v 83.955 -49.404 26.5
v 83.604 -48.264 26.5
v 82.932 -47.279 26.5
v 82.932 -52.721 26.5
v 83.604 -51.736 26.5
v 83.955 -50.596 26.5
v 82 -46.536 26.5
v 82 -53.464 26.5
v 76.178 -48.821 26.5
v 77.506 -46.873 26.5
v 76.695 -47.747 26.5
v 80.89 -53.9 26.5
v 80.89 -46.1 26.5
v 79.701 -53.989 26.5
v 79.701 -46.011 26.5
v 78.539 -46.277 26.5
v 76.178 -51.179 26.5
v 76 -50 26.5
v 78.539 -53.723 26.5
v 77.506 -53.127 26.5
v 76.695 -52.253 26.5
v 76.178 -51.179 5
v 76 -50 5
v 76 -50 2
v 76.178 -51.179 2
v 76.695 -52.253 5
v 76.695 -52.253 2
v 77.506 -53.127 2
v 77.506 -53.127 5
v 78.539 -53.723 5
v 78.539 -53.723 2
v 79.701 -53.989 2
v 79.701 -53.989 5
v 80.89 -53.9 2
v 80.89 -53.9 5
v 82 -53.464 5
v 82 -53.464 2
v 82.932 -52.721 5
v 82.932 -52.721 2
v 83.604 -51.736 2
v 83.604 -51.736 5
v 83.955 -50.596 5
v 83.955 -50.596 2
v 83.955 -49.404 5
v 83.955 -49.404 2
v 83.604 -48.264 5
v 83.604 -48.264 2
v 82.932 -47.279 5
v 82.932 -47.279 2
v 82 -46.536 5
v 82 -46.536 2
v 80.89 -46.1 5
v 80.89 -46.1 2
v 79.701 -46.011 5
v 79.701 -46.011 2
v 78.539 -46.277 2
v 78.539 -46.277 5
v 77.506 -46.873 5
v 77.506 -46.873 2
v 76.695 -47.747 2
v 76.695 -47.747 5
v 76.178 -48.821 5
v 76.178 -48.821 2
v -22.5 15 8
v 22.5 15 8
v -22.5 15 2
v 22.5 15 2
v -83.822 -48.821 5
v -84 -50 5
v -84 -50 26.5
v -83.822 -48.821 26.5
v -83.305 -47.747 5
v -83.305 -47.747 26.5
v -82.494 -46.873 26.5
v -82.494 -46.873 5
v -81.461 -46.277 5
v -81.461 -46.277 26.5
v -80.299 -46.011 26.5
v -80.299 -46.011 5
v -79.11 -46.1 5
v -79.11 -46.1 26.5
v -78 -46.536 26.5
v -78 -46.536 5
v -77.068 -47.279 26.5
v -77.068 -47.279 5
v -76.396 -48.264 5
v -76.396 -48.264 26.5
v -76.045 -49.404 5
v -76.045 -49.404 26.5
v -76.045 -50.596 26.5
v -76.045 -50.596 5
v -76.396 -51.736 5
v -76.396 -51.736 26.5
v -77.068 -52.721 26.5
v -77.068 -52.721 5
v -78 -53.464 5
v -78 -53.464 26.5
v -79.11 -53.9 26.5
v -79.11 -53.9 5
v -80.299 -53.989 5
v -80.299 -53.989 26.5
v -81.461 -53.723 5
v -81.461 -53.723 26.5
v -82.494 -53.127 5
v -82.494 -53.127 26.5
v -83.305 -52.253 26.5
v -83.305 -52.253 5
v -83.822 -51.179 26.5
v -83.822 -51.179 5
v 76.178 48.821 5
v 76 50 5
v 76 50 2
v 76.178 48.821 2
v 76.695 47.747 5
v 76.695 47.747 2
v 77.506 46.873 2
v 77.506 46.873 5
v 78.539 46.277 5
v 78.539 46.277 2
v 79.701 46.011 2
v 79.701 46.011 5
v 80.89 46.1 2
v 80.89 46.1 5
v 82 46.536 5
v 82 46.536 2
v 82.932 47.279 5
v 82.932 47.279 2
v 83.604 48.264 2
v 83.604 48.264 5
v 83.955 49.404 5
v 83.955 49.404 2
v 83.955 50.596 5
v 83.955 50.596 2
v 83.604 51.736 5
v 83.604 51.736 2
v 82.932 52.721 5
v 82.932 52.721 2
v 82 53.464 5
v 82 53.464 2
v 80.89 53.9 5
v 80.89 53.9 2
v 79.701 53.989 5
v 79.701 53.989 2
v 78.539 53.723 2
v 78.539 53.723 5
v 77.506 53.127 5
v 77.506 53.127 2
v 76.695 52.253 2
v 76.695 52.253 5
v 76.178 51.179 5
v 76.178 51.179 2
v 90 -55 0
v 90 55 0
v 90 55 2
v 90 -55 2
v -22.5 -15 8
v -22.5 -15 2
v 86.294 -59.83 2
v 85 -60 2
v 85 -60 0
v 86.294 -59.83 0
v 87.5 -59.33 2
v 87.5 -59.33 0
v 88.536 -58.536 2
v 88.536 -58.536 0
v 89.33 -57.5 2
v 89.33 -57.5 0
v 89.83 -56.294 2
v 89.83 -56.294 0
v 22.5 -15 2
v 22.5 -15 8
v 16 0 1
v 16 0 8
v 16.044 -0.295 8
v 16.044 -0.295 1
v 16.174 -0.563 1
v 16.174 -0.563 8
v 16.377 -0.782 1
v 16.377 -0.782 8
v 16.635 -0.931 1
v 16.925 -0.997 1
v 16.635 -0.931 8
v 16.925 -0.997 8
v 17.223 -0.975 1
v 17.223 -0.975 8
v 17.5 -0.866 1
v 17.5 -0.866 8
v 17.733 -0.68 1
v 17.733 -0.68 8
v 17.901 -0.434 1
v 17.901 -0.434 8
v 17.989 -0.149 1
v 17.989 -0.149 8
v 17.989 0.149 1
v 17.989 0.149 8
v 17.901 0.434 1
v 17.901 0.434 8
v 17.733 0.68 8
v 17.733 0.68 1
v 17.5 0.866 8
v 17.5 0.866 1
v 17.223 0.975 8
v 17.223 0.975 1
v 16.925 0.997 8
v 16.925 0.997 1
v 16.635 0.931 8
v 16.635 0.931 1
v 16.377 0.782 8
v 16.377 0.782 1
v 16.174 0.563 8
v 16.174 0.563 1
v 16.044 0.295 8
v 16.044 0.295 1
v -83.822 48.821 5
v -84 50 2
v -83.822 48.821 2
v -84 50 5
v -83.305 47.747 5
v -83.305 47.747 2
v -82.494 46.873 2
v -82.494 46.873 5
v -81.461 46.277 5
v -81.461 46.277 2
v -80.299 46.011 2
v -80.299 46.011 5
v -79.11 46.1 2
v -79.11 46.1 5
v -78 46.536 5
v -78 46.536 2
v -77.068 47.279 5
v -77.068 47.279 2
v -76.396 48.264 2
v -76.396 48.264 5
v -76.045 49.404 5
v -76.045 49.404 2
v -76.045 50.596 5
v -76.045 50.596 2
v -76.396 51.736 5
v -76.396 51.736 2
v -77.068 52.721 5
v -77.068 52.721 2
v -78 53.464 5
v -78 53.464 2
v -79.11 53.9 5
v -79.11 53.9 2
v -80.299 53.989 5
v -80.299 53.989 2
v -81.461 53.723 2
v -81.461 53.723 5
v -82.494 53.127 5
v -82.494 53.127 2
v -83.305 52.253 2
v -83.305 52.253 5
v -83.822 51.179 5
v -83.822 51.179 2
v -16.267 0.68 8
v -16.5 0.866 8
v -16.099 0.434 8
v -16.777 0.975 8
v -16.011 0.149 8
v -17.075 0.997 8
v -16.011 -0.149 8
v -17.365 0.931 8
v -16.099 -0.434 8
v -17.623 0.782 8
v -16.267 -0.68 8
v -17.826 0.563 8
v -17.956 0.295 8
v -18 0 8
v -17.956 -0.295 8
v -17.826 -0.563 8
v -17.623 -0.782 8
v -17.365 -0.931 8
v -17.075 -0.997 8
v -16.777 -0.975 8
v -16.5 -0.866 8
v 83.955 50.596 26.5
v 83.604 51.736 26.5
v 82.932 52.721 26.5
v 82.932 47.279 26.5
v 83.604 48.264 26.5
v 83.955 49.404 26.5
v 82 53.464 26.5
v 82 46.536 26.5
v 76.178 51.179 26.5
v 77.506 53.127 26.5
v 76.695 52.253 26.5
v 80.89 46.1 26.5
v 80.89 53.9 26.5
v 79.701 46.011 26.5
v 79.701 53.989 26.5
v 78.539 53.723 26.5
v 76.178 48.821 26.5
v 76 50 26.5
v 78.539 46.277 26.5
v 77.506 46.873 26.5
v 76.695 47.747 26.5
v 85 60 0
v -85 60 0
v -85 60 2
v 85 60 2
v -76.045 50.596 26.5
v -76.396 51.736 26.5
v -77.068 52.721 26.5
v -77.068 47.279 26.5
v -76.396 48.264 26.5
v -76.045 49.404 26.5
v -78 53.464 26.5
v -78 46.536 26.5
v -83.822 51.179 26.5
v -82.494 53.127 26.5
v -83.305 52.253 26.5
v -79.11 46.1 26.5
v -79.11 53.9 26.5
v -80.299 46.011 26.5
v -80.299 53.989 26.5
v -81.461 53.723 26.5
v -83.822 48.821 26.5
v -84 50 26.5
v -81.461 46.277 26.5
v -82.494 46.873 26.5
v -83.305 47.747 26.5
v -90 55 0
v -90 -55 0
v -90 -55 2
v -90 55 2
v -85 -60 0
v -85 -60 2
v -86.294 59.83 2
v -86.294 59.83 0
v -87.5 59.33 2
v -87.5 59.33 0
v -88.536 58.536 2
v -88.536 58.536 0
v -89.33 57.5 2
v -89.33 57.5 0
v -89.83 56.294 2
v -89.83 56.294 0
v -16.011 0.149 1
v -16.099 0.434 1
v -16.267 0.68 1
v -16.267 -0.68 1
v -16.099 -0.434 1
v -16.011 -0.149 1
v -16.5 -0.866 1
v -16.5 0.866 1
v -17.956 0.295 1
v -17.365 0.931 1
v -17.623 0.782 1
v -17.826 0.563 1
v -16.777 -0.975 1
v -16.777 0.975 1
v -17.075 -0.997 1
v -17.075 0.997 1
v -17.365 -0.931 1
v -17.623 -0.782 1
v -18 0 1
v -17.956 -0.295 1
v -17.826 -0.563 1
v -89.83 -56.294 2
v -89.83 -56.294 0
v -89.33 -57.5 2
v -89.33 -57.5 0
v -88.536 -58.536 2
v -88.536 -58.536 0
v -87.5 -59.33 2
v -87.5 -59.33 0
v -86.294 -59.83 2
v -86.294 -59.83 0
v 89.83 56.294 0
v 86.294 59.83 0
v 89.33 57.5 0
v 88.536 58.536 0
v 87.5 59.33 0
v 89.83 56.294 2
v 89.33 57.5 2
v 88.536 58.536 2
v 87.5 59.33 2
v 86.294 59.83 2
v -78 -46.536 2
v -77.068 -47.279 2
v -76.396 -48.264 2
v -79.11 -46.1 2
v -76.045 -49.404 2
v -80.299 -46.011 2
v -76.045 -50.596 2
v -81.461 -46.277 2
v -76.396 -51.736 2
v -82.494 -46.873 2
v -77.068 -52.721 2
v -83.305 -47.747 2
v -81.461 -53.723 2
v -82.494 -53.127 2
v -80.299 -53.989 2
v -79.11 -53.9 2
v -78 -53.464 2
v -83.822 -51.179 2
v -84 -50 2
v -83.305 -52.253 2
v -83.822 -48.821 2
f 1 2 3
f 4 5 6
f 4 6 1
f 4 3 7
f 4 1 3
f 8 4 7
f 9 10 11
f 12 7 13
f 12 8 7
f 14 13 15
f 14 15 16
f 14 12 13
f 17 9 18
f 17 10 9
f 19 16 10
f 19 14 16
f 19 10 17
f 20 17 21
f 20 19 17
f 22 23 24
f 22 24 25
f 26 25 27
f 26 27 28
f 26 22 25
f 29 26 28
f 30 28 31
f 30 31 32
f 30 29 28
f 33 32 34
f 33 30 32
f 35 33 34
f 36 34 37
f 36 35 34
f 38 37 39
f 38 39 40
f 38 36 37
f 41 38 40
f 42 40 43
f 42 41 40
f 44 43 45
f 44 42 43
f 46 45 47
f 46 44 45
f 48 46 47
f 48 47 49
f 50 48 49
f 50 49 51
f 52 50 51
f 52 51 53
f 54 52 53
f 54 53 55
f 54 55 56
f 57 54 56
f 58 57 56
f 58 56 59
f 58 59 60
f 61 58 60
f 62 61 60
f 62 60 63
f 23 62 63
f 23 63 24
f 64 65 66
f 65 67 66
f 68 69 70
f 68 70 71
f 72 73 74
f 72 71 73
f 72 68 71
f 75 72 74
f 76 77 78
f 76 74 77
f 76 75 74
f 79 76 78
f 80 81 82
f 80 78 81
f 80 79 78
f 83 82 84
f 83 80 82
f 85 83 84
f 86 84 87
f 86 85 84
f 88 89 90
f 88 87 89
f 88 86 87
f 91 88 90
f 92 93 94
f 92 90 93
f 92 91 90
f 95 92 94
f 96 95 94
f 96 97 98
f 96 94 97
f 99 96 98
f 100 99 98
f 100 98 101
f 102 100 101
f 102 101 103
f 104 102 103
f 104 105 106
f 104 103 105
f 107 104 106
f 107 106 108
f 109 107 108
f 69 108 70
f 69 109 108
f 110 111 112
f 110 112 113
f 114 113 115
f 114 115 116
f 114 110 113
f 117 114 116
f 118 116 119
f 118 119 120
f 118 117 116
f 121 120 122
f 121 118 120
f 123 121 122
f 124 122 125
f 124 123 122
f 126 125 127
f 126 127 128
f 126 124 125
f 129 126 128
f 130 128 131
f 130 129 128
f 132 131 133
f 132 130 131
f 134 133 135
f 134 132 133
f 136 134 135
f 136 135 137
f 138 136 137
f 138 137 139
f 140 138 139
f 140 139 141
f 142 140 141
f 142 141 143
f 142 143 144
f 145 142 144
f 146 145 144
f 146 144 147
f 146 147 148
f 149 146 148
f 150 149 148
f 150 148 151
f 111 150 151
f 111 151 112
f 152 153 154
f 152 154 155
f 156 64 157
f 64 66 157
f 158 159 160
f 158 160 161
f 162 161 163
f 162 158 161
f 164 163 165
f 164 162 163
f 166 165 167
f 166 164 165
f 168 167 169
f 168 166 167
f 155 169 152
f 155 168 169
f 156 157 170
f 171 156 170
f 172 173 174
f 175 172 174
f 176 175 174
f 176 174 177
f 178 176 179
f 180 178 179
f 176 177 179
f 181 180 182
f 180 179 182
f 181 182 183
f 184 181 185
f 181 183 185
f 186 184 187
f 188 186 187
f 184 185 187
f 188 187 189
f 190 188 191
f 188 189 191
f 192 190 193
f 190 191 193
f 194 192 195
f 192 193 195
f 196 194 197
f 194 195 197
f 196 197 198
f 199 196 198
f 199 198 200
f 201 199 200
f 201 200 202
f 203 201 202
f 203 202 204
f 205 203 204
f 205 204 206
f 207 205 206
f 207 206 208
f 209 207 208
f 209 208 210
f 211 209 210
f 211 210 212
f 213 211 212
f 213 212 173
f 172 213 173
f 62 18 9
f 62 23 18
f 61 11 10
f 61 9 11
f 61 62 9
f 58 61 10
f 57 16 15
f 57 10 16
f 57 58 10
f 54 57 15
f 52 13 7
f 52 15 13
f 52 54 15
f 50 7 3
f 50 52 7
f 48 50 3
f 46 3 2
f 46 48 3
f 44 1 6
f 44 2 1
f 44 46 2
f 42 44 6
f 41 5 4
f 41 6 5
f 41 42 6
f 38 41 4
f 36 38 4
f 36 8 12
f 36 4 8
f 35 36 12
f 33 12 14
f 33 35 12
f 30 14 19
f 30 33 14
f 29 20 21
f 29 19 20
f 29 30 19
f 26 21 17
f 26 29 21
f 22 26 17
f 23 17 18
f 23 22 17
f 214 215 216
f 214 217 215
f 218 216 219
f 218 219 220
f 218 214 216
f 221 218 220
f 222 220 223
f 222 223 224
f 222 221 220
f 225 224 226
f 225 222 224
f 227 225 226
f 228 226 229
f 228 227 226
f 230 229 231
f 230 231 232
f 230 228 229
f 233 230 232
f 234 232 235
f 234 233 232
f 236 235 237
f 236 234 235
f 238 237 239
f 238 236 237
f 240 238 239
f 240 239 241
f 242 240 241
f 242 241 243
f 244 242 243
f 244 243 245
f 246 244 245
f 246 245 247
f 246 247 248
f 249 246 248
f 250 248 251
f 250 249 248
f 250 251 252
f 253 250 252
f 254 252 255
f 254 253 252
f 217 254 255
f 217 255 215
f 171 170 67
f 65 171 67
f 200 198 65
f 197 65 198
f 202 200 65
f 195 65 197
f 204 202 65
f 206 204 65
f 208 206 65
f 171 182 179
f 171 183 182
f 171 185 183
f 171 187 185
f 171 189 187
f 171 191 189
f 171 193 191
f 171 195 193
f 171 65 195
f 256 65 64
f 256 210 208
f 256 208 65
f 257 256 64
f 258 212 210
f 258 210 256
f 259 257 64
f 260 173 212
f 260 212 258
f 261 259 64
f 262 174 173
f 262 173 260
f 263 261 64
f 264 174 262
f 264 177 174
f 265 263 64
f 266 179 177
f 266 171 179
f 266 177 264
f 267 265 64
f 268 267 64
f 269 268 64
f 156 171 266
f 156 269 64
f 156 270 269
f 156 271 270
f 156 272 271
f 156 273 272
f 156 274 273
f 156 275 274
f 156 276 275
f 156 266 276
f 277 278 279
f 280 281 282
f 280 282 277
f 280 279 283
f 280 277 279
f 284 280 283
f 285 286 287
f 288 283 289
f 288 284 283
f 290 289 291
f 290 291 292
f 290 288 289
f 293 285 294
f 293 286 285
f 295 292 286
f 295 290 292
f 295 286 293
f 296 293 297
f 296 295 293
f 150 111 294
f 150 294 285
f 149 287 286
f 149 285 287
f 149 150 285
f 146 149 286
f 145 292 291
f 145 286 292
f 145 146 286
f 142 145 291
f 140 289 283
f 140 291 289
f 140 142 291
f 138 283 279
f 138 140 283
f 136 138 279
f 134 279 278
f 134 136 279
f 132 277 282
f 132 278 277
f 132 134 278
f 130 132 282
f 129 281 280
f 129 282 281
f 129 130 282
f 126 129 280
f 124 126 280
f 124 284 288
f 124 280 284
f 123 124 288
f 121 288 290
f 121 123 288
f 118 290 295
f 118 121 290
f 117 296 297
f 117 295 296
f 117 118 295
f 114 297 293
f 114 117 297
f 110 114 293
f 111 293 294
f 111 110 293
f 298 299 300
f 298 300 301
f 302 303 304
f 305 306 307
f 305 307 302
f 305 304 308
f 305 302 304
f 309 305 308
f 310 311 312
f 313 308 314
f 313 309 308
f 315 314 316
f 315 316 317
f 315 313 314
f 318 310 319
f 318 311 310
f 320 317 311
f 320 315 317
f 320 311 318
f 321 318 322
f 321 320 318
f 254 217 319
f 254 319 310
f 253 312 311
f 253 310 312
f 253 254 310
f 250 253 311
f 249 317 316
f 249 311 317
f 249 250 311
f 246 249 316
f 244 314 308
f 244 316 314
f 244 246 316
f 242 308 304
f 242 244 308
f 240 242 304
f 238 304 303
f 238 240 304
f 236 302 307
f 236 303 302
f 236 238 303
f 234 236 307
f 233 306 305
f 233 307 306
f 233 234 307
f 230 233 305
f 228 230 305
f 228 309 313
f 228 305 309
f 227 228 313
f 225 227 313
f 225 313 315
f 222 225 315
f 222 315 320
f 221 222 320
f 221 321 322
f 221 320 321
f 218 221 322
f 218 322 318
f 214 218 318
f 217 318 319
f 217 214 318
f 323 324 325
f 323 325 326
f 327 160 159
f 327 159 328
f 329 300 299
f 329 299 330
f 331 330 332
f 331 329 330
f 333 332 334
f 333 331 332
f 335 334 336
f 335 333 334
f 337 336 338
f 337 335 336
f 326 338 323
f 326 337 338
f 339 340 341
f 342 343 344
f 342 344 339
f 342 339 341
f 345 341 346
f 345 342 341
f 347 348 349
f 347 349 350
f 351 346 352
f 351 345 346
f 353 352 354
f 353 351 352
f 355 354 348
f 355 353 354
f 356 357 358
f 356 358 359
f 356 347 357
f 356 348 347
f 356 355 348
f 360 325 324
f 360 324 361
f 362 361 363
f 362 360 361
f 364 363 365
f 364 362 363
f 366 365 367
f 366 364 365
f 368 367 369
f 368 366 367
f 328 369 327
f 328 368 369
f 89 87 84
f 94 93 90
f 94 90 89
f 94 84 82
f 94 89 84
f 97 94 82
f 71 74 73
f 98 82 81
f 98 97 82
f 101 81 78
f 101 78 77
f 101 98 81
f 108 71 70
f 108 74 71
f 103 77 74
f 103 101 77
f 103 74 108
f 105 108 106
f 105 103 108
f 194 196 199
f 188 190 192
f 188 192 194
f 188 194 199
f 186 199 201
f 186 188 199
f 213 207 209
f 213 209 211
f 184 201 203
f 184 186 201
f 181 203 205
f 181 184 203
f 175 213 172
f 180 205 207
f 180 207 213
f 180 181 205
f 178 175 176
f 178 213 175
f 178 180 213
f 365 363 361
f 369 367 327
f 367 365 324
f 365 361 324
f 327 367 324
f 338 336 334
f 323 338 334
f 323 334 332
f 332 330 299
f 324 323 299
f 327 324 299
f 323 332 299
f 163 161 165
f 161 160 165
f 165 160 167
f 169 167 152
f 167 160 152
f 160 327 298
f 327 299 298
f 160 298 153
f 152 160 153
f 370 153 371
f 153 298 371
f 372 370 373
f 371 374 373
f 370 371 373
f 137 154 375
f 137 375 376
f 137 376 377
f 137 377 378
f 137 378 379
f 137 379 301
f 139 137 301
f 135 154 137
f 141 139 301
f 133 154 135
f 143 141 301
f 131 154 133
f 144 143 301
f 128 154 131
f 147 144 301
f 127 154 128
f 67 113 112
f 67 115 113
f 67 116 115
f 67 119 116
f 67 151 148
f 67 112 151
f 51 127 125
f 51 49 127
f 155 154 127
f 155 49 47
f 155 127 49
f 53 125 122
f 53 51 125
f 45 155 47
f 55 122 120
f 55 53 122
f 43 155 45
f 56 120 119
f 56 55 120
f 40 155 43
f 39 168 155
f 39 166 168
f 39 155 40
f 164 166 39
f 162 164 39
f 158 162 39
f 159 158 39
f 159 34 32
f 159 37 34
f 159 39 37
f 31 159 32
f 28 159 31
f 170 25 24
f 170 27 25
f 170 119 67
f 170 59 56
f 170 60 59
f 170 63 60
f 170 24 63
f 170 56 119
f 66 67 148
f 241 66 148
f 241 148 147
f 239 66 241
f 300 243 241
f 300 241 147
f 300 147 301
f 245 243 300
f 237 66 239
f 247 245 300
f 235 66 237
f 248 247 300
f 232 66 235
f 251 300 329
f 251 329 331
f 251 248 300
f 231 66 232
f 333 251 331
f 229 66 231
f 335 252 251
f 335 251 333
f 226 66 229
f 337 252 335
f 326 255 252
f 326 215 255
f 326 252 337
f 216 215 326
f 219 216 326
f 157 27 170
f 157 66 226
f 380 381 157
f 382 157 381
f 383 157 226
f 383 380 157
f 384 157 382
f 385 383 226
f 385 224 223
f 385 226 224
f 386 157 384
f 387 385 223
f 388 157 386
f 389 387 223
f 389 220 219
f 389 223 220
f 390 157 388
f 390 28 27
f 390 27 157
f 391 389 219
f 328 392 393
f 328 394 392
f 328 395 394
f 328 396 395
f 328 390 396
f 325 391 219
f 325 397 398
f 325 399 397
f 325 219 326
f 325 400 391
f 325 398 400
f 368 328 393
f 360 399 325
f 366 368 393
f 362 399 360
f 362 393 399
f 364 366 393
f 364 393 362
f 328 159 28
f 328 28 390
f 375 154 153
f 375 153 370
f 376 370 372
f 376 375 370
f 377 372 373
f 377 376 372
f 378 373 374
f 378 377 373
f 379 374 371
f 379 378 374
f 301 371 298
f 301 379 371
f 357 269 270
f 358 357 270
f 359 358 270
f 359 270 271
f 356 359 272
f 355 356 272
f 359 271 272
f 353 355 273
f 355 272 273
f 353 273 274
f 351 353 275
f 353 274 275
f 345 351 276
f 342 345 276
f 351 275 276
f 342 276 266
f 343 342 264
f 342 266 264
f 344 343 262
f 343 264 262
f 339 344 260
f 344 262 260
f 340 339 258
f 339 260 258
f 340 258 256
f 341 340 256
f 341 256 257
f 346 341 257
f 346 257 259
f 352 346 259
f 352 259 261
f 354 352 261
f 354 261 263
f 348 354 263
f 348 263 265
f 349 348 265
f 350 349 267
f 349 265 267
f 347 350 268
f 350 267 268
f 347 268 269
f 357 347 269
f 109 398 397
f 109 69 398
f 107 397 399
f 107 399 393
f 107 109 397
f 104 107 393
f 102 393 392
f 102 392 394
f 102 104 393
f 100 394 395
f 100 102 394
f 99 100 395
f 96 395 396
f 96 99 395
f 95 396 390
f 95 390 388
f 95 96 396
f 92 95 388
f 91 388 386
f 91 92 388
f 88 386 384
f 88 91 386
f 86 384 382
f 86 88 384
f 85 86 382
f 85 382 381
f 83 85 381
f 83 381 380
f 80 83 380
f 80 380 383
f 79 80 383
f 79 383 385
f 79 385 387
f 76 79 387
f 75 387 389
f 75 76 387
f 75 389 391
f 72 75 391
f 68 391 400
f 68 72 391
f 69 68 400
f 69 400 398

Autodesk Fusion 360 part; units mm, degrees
sketch "Sketch1" plane through (0, 0, 0) normal (0, 0, 1) x (1, 0, 0)
  line L0 (90, -60) -> (-90, -60)
  line L1 (-90, -60) -> (-90, 60)
  line L2 (-90, 60) -> (90, 60)
  line L3 (90, 60) -> (90, -60)
  line L4 (90, -60) -> (-90, 60) construction
  line L5 (-90, -60) -> (90, 60) construction
  circle A0 centre (-80, 50) radius 5
  circle A1 centre (-80, -50) radius 5
  circle A2 centre (80, 50) radius 5
  circle A3 centre (80, -50) radius 5
  dimension "d1" = 180
  dimension "d2" = 120
  dimension "d3" = 10
  dimension "d4" = 10
  dimension "d5" = 10
  dimension "d6" = 10
sketch "Sketch2" plane through (0, 0, 0) normal (0, 0, 1) x (1, 0, 0)
  line L0 (90, -60) -> (-90, -60)
  line L1 (-90, -60) -> (-90, 60)
  line L2 (-90, 60) -> (90, 60)
  line L3 (90, 60) -> (90, -60)
  line L4 (90, -60) -> (-90, 60) construction
  line L5 (-90, -60) -> (90, 60) construction
  dimension "d9" = 180
  dimension "d10" = 120
extrude "Extrude2" add sketch "Sketch2" along normal blind 5 makes body 1
sketch "Sketch3" plane through (0, 0, 5) normal (0, 0, 1) x (-1, 0, 0)
  line L0 (-90, -60) -> (90, -60)
  line L1 (90, -60) -> (90, 60)
  line L2 (90, 60) -> (-90, 60)
  line L3 (-90, 60) -> (-90, -60)
sketch "Sketch4" plane through (0, 0, 5) normal (0, 0, 1) x (-1, 0, 0)
  circle A0 centre (-80, 50) radius 4
  circle A1 centre (80, 50) radius 4
  circle A2 centre (-80, -50) radius 4
  circle A3 centre (80, -50) radius 4
  dimension "d13" = 8
  dimension "d14" = 8
  dimension "d15" = 8
  dimension "d16" = 8
extrude "Extrude3" add sketch "Sketch4" along normal blind 50 bodies 1
sketch "Sketch5" plane through (0, 0, 5) normal (0, 0, 1) x (-1, 0, 0)
  line L0 (22.5, -15) -> (-22.5, -15)
  line L1 (-22.5, -15) -> (-22.5, 15)
  line L2 (-22.5, 15) -> (22.5, 15)
  line L3 (22.5, 15) -> (22.5, -15)
  line L4 (22.5, -15) -> (-22.5, 15) construction
  line L5 (-22.5, -15) -> (22.5, 15) construction
  dimension "d19" = 45
  dimension "d20" = 30
extrude "Extrude4" add sketch "Sketch5" along normal blind 10 bodies 1
sketch "Sketch6" plane through (0, 0, 15) normal (0, 0, 1) x (-1, 0, 0)
  line L0 (22.5, 15) -> (-22.5, 15)
  line L1 (-22.5, 15) -> (-22.5, -15)
  line L2 (-22.5, -15) -> (22.5, -15)
  line L3 (22.5, -15) -> (22.5, 15)
  circle A0 centre (17, 0) radius 1
  circle A1 centre (-17, 0) radius 1
  dimension "d23" = 17
  dimension "d24" = 17
  dimension "d25" = 2
  dimension "d26" = 2
extrude "Extrude5" cut sketch "Sketch6" against normal blind 9 contours A0 | A1 bodies 1
extrude "Extrude6" cut 4 faces at (77.7042, -51.1056, 55) (77.7042, 48.8944, 55) (-82.2958, 48.8944, 55) (-82.2958, -51.1056, 55) along direction (0, 0, -1) blind 10 on bodies 1 bodies 1
extrude "Extrude7" cut 1 faces at (-5.4223, 10.2267, 15) along direction (0, 0, -1) blind 10 on bodies 1 bodies 1
extrude "Extrude8" cut sketch "Sketch3" against normal blind 3 bodies 1 makes body 2 at (-17.995, 0.0996, 5.3333) makes body 3 at (16.005, 0.0996, 5.3333) makes body 4 at (76.0199, -49.6017, 18.3333) makes body 5 at (-83.9801, -49.6017, 18.3333) makes body 6 at (76.0199, 50.3983, 18.3333) makes body 7 at (30, -20, 0)
extrude "Extrude9" add 1 faces at (-82.2958, 48.8944, 5) along direction (0, 0, -1) blind 3 on bodies 1 bodies 1 7
extrude "Extrude10" add 3 faces at (-82.2958, -51.1056, 5) (77.7042, -51.1056, 5) (77.7042, 48.8944, 5) along direction (0, 0, -1) blind 3 on bodies 4 5 6 bodies 5 1 4 6
sketch "Sketch7" plane through (0, 0, 2) normal (0, 0, 1) x (-1, 0, 0)
  circle A0 centre (-80, -50) radius 4
  circle A1 centre (80, 50) radius 4
  circle A2 centre (-80, 50) radius 4
  circle A3 centre (80, -50) radius 4
  line L0 (-90, 60) -> (-90, -60)
  line L1 (-90, -60) -> (90, -60)
  line L2 (90, -60) -> (90, 60)
  line L3 (90, 60) -> (-90, 60)
  line L4 (22.5, 15) -> (-22.5, 15)
  line L5 (-22.5, 15) -> (-22.5, -15)
  line L6 (-22.5, -15) -> (22.5, -15)
  line L7 (22.5, -15) -> (22.5, 15)
  line L8 (22.5, 15) -> (-22.5, -15) construction
  line L9 (-22.5, 15) -> (22.5, -15) construction
  dimension "d39" = 45
  dimension "d40" = 30
extrude "Extrude11" add sketch "Sketch7" along normal blind 6 contours L4 L5 L6 L7 bodies 2 3 5
sketch "Sketch8" plane through (0, 0, 8) normal (0, 0, 1) x (-1, 0, 0)
  line L0 (22.5, -15) -> (22.5, 15)
  line L1 (22.5, 15) -> (-22.5, 15)
  line L2 (-22.5, 15) -> (-22.5, -15)
  line L3 (-22.5, -15) -> (22.5, -15)
  circle A0 centre (-17, 0) radius 1
  circle A1 centre (17, 0) radius 1
  dimension "d43" = 17
  dimension "d44" = 17
  dimension "d45" = 2
  dimension "d46" = 2
extrude "Extrude12" cut sketch "Sketch8" against normal blind 7 contours A0 | A1 bodies 2
extrude "Extrude13" cut 4 faces at (77.7042, 48.8944, 45) (77.7042, -51.1056, 45) (-82.2958, -51.1056, 45) (-82.2958, 48.8944, 45) along direction (0, 0, -1) blind 10 on bodies 2 bodies 2
extrude "Extrude14" cut 4 faces at (77.7042, -51.1056, 35) (77.7042, 48.8944, 35) (-82.2958, 48.8944, 35) (-82.2958, -51.1056, 35) along direction (0, 0, -1) blind 8.5 on bodies 2 bodies 2
fillet "Fillet1" radius 5 4 edges at (-90, 60, 1) (-90, -60, 1) (90, -60, 1) (90, 60, 1) on bodies 1 2 5 7
sketch "Sketch9" plane through (0, 0, 2) normal (0, 0, 1) x (-1, 0, 0)
  circle A0 centre (80, 150) radius 5
  circle A1 centre (-80, 150) radius 5
  circle A2 centre (80, 250) radius 5
  circle A3 centre (-80, 250) radius 5
  line L0 (-90, 140) -> (90, 140)
  line L1 (90, 140) -> (90, 260)
  line L2 (90, 260) -> (-90, 260)
  line L3 (-90, 260) -> (-90, 140)
sketch "Sketch10" plane through (0, 0, 2) normal (0, 0, 1) x (-1, 0, 0)
  circle A0 centre (80, 150) radius 4.5
  circle A1 centre (-80, 150) radius 4.5
  circle A2 centre (80, 250) radius 4.5
  circle A3 centre (-80, 250) radius 4.5
  circle A4 centre (80, 250) radius 5.5
  circle A5 centre (80, 150) radius 5.5
  circle A6 centre (-80, 150) radius 5.5
  circle A7 centre (-80, 250) radius 5.5
  circle A8 centre (-80, 150) radius 5
  circle A9 centre (80, 250) radius 5
  circle A10 centre (80, 150) radius 5
  circle A11 centre (-80, 250) radius 5
  dimension "d59" = 9
  dimension "d60" = 9
  dimension "d61" = 9
  dimension "d62" = 9
  dimension "d63" = 11
  dimension "d64" = 11
  dimension "d65" = 11
  dimension "d66" = 11
